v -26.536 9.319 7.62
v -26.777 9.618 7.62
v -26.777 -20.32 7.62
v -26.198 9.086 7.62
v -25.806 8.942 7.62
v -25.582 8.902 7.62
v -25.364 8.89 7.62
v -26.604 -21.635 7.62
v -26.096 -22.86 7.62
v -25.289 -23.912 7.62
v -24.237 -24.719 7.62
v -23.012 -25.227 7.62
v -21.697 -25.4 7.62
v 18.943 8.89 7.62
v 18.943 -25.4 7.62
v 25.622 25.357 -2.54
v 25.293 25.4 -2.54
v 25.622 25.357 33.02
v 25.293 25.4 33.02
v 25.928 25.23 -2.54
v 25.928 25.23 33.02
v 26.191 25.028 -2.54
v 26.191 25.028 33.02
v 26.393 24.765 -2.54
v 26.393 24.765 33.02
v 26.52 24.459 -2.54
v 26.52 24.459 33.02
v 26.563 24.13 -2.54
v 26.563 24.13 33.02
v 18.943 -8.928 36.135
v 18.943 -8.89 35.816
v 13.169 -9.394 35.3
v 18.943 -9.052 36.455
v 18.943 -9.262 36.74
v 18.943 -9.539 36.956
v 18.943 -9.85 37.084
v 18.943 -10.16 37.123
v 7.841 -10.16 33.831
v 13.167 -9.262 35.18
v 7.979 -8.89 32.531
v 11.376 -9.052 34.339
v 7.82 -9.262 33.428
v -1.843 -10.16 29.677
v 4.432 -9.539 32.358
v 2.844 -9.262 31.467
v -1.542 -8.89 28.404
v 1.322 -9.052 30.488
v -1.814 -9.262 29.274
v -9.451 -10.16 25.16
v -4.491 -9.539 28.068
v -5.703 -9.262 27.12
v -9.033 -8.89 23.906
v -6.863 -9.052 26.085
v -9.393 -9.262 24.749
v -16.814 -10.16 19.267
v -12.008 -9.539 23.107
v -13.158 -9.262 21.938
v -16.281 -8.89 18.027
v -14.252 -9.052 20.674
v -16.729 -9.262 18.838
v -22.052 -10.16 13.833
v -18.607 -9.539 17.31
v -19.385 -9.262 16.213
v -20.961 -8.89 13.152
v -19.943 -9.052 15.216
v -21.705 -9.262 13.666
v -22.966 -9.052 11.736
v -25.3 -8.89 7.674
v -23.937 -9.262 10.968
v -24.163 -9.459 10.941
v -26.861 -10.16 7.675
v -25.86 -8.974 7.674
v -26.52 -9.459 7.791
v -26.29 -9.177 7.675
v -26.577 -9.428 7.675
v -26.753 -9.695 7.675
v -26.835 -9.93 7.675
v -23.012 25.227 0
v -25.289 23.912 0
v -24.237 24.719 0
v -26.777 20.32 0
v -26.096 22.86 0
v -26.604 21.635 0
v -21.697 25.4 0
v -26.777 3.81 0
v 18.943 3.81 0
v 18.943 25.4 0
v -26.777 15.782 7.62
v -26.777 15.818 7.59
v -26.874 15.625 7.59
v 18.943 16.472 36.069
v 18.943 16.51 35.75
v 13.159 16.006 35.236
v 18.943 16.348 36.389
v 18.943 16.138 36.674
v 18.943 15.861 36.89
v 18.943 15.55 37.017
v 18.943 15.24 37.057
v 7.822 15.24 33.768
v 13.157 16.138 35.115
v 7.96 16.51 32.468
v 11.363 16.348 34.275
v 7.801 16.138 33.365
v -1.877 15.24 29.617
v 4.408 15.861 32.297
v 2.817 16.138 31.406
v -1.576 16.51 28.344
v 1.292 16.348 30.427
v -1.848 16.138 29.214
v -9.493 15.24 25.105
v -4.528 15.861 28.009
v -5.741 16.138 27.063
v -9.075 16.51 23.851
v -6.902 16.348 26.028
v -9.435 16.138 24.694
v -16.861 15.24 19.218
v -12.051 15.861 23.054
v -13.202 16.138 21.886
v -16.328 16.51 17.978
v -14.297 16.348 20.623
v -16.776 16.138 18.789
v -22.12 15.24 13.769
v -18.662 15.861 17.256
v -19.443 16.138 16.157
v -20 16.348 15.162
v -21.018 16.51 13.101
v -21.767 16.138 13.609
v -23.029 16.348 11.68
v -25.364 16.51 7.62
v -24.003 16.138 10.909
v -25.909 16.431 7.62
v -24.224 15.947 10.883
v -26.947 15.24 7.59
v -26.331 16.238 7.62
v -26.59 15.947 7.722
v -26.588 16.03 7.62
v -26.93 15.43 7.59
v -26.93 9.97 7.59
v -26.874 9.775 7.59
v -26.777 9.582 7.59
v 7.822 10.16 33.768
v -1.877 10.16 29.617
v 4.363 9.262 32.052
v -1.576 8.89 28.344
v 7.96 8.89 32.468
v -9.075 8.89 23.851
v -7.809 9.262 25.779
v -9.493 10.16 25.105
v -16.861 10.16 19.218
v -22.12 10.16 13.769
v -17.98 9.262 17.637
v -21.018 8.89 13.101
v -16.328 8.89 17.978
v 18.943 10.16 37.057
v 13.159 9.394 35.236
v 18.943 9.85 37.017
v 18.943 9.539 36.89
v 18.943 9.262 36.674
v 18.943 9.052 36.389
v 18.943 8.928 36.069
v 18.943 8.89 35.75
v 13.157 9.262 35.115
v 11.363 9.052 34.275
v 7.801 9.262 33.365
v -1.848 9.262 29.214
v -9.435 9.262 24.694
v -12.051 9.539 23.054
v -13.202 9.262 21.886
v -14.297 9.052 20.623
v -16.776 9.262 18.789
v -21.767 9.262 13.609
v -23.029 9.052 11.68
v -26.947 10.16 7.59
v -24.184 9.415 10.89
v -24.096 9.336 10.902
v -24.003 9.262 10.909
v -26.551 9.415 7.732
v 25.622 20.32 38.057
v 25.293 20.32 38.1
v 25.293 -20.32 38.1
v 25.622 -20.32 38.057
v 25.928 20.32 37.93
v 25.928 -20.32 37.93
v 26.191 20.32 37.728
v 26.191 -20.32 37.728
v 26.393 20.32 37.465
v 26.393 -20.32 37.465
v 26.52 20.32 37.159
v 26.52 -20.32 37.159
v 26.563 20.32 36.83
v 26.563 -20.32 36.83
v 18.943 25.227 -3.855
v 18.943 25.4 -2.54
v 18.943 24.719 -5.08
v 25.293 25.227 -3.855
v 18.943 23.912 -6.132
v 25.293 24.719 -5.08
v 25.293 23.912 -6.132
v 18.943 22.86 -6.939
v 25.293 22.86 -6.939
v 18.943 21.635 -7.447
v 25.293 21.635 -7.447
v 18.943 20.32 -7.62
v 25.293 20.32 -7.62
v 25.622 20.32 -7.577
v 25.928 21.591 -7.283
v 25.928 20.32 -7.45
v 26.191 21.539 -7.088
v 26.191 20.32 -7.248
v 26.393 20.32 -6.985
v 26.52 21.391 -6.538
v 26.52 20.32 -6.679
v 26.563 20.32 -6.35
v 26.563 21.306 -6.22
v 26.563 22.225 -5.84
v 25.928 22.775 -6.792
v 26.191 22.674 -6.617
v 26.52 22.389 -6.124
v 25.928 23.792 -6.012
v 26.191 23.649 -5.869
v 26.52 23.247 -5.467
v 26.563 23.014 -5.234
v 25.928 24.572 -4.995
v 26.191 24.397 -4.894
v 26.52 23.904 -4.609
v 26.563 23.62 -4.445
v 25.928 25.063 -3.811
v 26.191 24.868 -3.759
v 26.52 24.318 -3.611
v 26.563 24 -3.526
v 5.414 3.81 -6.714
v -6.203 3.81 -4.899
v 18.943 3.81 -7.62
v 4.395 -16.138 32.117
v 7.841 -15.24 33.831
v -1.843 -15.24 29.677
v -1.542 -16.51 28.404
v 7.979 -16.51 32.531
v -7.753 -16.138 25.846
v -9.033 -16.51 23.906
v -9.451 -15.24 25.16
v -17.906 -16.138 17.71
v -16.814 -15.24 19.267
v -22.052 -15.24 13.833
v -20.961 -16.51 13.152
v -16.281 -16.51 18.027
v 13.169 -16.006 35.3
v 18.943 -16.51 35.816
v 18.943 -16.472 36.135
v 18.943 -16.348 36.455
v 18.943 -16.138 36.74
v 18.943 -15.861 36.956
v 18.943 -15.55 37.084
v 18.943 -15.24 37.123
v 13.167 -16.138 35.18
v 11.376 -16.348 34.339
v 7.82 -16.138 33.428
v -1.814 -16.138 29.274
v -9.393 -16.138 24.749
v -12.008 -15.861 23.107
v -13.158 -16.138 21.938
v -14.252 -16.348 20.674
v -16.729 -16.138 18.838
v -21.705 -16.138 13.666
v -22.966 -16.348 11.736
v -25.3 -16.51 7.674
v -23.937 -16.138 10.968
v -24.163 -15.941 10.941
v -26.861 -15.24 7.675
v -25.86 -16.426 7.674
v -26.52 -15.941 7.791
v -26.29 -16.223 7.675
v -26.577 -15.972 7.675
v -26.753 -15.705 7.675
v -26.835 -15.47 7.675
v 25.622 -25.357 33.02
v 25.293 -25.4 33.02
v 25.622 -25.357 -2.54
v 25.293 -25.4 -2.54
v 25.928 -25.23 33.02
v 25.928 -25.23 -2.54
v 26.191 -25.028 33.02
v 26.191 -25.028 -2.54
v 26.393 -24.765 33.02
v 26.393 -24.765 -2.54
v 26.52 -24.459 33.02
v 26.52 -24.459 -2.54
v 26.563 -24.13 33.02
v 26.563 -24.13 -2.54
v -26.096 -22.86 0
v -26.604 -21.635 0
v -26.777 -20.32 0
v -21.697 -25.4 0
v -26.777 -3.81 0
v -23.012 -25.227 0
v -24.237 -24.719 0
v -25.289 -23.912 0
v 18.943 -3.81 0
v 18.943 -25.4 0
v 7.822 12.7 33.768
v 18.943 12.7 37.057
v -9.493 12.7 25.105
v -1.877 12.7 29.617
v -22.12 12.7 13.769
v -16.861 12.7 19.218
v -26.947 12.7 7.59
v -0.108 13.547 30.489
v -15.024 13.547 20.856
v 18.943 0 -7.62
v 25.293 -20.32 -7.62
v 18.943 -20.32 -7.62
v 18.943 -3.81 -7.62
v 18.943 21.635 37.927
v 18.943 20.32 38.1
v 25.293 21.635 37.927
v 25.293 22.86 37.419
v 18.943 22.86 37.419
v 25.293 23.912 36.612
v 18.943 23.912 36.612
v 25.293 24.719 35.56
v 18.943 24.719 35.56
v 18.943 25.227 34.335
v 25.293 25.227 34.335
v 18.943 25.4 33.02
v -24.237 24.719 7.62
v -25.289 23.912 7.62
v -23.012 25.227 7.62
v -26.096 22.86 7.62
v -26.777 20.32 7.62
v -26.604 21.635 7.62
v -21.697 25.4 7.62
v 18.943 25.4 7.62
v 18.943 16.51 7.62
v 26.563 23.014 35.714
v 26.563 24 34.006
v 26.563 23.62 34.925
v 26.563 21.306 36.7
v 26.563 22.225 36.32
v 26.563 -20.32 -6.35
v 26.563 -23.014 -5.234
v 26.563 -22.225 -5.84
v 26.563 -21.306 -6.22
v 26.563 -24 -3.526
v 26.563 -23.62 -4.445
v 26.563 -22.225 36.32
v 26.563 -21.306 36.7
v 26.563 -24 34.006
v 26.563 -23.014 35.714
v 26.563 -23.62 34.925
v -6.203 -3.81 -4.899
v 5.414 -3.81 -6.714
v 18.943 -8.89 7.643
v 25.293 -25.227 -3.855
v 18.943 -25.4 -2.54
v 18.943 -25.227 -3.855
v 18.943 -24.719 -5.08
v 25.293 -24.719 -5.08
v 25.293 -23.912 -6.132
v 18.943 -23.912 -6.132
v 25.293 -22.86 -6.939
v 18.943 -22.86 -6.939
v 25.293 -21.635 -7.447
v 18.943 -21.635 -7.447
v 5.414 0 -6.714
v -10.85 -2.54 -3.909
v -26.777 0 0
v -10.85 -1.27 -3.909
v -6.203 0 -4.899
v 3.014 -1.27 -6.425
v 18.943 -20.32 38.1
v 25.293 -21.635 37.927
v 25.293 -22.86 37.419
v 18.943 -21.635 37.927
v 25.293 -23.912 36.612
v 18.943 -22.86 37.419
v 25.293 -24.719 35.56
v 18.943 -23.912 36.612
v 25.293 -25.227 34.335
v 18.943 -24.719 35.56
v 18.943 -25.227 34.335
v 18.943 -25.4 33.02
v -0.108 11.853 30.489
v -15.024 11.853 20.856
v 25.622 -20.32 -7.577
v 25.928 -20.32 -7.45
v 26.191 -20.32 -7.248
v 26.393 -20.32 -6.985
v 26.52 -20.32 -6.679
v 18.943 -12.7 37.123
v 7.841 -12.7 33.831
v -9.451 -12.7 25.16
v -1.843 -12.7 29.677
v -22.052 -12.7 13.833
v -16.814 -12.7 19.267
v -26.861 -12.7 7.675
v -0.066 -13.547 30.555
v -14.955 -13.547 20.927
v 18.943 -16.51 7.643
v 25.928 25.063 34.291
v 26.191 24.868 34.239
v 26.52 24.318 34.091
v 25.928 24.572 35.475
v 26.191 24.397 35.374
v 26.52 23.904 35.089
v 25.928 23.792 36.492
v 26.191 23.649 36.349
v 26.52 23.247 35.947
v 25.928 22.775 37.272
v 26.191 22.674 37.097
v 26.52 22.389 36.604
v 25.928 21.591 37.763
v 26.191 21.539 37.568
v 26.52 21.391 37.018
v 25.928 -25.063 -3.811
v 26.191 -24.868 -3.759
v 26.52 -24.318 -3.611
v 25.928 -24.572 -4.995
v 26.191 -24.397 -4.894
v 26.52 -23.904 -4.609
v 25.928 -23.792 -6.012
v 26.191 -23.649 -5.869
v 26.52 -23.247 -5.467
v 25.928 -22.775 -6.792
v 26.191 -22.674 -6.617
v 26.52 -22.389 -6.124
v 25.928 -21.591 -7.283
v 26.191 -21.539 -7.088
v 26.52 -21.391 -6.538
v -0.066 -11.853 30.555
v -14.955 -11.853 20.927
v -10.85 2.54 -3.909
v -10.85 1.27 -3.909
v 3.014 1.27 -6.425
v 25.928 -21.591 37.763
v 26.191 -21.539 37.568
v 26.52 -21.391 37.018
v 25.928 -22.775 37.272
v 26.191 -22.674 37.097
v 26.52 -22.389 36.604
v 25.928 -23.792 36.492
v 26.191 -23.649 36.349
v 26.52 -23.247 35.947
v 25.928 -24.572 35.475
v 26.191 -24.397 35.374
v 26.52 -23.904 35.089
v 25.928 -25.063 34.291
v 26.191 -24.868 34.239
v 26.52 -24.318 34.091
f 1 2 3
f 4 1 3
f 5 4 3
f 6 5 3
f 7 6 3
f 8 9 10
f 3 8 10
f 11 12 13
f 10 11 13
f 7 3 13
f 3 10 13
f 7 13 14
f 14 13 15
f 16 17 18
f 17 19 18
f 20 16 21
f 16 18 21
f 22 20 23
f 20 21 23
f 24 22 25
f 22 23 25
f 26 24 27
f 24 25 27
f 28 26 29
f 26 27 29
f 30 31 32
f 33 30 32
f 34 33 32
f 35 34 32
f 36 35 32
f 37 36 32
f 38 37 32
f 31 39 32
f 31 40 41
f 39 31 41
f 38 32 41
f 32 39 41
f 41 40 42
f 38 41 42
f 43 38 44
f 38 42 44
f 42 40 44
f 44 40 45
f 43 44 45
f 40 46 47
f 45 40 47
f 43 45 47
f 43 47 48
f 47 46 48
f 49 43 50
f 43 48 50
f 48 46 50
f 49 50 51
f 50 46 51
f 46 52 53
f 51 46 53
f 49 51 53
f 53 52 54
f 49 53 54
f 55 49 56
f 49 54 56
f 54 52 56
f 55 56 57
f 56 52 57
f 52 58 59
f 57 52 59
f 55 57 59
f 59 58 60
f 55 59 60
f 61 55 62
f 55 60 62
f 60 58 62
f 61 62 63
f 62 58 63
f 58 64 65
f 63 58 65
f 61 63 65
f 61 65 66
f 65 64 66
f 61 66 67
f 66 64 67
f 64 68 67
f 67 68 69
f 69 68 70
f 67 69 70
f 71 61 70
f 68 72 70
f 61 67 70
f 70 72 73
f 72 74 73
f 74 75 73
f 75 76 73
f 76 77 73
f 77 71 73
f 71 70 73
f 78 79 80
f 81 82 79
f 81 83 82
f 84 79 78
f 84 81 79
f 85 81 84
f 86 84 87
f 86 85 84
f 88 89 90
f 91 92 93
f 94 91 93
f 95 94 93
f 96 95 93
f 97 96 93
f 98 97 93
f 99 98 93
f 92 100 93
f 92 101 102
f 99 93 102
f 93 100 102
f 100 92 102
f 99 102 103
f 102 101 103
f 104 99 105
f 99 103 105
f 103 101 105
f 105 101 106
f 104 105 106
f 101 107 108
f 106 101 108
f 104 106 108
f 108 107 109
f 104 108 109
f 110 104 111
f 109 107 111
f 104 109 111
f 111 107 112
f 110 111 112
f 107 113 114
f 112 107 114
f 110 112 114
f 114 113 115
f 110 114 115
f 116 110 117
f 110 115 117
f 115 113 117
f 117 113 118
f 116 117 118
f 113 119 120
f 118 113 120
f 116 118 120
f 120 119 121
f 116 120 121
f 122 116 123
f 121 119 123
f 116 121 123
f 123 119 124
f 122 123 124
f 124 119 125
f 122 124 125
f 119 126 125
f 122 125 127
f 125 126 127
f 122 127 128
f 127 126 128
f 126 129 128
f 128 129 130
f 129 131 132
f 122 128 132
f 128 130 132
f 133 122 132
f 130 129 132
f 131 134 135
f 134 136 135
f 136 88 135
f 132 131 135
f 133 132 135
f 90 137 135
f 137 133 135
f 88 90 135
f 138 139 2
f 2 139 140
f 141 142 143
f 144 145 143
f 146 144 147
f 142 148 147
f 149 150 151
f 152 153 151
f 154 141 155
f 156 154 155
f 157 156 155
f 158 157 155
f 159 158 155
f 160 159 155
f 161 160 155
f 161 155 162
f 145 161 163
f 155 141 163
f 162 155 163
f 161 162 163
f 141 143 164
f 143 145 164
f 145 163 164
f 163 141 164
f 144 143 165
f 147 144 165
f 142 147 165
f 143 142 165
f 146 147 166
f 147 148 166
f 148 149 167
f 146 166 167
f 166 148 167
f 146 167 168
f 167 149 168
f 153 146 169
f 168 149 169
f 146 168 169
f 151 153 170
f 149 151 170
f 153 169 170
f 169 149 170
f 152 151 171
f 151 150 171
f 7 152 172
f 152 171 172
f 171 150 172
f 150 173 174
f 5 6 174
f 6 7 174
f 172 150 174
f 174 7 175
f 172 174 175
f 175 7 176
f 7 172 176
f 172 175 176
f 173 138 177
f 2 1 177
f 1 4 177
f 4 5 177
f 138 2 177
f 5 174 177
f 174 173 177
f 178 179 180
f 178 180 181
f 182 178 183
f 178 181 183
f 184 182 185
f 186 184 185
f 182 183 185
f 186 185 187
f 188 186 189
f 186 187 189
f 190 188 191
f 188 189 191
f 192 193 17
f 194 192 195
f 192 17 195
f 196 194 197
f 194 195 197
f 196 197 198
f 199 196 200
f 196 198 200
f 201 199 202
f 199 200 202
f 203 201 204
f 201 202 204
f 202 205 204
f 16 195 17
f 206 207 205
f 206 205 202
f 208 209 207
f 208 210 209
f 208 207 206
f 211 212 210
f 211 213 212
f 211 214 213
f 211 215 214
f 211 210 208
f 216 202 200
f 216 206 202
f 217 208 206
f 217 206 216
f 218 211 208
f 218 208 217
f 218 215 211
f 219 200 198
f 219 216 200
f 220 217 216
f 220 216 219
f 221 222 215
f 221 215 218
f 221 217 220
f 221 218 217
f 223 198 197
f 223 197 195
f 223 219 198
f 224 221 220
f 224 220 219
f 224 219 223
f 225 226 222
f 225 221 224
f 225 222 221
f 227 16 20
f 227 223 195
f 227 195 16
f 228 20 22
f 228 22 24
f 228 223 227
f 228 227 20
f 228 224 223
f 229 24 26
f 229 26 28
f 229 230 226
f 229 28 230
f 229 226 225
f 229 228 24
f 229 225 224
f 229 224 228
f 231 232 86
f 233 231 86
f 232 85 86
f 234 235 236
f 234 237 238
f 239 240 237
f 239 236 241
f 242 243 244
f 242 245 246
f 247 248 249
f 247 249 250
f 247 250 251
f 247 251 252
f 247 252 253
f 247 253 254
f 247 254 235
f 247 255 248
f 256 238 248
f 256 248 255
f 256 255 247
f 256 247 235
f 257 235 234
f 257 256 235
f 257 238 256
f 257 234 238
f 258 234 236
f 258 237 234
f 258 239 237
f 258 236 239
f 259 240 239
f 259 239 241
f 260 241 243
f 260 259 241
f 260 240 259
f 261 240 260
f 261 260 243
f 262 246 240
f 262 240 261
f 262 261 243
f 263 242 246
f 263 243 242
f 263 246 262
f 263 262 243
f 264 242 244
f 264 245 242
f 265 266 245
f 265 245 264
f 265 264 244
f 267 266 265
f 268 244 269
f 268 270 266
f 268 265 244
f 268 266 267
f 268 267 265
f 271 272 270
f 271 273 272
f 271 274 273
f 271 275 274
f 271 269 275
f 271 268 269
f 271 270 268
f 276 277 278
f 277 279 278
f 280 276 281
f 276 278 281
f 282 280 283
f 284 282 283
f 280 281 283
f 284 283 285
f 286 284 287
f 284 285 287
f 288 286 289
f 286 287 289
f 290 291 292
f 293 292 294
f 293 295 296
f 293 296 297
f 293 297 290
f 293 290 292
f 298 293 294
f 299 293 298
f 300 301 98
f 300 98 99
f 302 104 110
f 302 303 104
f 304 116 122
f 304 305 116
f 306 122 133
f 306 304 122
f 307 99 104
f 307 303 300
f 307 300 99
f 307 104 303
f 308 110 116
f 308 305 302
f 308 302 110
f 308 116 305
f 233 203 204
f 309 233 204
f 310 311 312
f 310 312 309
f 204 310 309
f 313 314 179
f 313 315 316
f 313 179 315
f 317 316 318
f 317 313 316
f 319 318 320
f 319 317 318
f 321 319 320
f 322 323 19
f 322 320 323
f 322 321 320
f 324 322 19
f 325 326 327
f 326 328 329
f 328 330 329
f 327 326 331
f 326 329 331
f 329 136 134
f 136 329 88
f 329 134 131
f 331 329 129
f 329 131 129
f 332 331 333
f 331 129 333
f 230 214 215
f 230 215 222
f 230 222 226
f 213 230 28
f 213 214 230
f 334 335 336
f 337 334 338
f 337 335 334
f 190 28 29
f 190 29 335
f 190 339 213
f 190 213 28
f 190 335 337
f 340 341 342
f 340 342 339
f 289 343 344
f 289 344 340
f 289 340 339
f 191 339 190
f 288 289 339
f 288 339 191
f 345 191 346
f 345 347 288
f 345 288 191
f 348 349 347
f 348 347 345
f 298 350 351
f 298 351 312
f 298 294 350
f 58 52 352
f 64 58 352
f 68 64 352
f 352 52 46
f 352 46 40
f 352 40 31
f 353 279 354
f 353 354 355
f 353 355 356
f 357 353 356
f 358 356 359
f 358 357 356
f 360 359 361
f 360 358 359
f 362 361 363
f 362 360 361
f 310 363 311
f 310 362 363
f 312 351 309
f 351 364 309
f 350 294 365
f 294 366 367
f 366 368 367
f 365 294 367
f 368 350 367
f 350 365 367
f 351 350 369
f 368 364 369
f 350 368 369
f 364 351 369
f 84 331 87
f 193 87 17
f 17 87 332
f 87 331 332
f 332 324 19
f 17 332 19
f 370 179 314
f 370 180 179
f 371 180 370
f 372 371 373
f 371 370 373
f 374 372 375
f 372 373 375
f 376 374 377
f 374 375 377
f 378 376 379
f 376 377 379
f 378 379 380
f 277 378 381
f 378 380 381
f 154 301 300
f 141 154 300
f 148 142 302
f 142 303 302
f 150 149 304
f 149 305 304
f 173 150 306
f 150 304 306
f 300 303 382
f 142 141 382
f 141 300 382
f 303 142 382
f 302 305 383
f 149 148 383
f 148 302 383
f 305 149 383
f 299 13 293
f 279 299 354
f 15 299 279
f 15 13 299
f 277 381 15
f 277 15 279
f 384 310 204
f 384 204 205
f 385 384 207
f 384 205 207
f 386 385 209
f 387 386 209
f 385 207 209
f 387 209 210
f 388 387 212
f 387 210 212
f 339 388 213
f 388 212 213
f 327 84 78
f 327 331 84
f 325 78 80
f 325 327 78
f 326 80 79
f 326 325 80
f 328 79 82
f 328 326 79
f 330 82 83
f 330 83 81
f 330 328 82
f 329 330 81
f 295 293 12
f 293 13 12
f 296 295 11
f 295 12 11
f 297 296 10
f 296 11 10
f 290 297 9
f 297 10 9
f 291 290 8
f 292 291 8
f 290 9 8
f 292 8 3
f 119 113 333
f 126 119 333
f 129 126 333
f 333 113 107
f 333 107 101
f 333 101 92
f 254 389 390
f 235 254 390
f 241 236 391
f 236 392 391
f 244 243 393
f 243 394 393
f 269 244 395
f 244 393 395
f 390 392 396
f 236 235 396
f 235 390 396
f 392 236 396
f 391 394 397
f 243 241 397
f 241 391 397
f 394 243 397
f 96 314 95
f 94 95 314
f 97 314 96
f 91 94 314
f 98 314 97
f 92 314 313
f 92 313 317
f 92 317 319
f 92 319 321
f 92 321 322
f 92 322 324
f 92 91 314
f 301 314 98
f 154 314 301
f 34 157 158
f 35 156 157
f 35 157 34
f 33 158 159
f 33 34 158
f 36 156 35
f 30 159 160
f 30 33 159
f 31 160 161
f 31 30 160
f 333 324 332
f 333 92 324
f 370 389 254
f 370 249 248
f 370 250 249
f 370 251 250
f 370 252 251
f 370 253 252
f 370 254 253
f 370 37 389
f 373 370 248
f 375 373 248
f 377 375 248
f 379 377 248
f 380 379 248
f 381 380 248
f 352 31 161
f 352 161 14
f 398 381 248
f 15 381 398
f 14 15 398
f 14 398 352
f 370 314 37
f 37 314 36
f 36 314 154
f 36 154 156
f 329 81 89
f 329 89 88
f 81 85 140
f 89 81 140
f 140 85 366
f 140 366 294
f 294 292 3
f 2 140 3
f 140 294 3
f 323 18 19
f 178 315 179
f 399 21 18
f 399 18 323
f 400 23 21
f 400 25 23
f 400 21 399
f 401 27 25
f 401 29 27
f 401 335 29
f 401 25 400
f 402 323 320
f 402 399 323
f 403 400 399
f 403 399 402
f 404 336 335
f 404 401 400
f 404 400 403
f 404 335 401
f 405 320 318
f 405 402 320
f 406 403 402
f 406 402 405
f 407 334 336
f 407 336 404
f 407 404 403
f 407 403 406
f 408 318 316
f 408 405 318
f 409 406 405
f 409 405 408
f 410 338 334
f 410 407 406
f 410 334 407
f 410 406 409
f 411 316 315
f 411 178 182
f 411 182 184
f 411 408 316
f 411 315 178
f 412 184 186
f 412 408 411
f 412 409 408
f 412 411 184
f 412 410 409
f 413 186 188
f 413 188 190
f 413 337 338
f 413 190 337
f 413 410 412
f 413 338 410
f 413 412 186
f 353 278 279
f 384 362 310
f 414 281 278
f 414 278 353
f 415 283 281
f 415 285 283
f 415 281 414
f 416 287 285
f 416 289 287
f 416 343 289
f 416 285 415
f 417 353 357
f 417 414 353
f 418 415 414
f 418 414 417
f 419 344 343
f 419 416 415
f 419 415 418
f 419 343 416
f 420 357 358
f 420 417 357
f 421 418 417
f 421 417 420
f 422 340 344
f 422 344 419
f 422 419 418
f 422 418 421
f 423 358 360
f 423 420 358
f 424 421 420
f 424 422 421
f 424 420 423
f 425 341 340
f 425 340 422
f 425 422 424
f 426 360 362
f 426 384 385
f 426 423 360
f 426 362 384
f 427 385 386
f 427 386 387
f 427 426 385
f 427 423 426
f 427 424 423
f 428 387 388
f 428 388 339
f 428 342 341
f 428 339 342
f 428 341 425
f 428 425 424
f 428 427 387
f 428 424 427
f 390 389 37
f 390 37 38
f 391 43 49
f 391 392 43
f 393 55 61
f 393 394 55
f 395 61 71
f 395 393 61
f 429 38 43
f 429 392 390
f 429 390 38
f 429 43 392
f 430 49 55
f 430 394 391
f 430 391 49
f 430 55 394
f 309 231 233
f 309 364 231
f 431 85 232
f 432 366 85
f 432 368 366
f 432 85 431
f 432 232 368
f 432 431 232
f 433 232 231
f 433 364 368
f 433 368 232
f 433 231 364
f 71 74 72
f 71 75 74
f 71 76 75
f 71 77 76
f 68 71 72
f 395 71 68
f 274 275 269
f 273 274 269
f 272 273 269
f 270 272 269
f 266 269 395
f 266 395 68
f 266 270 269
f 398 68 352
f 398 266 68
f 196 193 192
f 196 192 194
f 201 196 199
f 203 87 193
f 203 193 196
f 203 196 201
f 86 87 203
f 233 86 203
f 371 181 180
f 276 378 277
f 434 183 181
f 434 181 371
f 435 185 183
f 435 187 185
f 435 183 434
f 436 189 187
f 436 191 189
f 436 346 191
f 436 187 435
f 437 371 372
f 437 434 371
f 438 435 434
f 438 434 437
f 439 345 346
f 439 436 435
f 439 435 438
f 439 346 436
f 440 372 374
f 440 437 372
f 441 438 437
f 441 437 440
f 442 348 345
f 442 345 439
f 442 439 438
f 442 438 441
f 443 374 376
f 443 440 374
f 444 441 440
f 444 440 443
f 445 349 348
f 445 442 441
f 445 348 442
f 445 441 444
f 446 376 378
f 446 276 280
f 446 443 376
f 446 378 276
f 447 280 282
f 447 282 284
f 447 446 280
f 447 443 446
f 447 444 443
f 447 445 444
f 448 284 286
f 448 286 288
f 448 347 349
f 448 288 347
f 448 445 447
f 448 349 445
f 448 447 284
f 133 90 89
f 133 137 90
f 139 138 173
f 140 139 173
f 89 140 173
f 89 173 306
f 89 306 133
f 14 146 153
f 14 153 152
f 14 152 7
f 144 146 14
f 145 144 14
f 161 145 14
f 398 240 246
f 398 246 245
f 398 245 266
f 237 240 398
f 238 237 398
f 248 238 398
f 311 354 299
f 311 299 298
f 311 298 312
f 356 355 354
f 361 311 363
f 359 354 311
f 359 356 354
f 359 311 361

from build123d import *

# Parameters (mm, degrees)
F0_W      = 45.72
F0_H      = 7.62
F1_DEPTH  = 25.4
F2_DEPTH  = 25.4
F3_DEPTH  = 3.81
F4_R      = 5.08
F7_DEPTH  = 3.81
F10_DEPTH = 3.81
F11_R     = 1.27


with BuildPart() as f1:
    # F0 (on Front) → F1 (new body, symmetric)
    with BuildSketch(Plane.XZ):
        with Locations((-3.917041, 3.81)):
            Rectangle(F0_W, F0_H)
    extrude(amount=F1_DEPTH, both=True)

    # F0 (on Front) → F2 (join, symmetric)
    with BuildSketch(Plane.XZ):
        Polygon((26.562959, 38.1), (18.942959, 38.1), (18.942959, 7.62), (18.942959, 0), (18.942959, -7.62), (26.562959, -7.62), align=None)
    extrude(amount=F2_DEPTH, both=True)

    # F0 (on Front) → F3 (join, symmetric)
    with BuildSketch(Plane.XZ):
        with BuildLine():
            Line((18.942959, -7.62), (18.942959, 0))
            Line((18.942959, 0), (-26.777041, 0))
            add(Edge.make_bspline(
                [(-26.777041, 0), (-8.442144, -4.630308), (0.605608, -7.060291), (18.942959, -7.62)],
                knots=[0, 0, 0, 0, 46.35065, 46.35065, 46.35065, 46.35065], degree=3))
        make_face()
    extrude(amount=F3_DEPTH, both=True)

    # F4
    f4_edges = [f1.edges().sort_by_distance(p)[0] for p in [
        (22.752959, -25.4, -7.62),
        (22.752959, 25.4, -7.62),
        (22.752959, 25.4, 38.1),
        (22.752959, -25.4, 38.1),
        (-26.777041, 25.4, 3.81),
        (-26.777041, -25.4, 3.81),
    ]]
    fillet(f4_edges, radius=F4_R)

    # F6 (on offset) → F7 (join, symmetric)
    with BuildSketch(Plane.XZ.offset(12.7)):
        with BuildLine():
            Line((19.504473, 7.642324), (19.504473, 37.258741))
            add(Edge.make_bspline(
                [(19.504473, 37.258741), (-2.269479, 32.051925), (-15.974103, 23.058929), (-26.861079, 7.675159)],
                knots=[0, 0, 0, 0, 54.99957, 54.99957, 54.99957, 54.99957], degree=3))
            Line((-26.861079, 7.675159), (19.504473, 7.642324))
        make_face()
    extrude(amount=F7_DEPTH, both=True)

    # F9 (on offset) → F10 (join, symmetric)
    with BuildSketch(Plane.XZ.offset(-12.7)):
        with BuildLine():
            Line((19.418189, 7.557305), (19.418189, 37.171504))
            add(Edge.make_bspline(
                [(19.418189, 37.171504), (-2.355763, 31.964688), (-16.060385, 22.97391), (-26.947361, 7.590141)],
                knots=[0, 0, 0, 0, 54.998375, 54.998375, 54.998375, 54.998375], degree=3))
            Line((-26.947361, 7.590141), (19.418189, 7.557305))
        make_face()
    extrude(amount=F10_DEPTH, both=True)

    # F11
    f11_edges = [f1.edges().sort_by_distance(p)[0] for p in [
        (26.562959, 25.4, 15.24),
        (26.562959, 23.912102, -6.132102),
        (26.562959, 23.912102, 36.612102),
        (26.562959, 0, -7.62),
        (26.562959, 0, 38.1),
        (26.562959, -23.912102, -6.132102),
        (26.562959, -23.912102, 36.612102),
        (26.562959, -25.4, 15.24),
        (-6.865306, -16.51, 26.848425),
        (-6.865306, -8.89, 26.848425),
        (-6.913699, 16.51, 26.785701),
        (-6.913699, 8.89, 26.785701),
    ]]
    fillet(f11_edges, radius=F11_R)


solid = f1.part
